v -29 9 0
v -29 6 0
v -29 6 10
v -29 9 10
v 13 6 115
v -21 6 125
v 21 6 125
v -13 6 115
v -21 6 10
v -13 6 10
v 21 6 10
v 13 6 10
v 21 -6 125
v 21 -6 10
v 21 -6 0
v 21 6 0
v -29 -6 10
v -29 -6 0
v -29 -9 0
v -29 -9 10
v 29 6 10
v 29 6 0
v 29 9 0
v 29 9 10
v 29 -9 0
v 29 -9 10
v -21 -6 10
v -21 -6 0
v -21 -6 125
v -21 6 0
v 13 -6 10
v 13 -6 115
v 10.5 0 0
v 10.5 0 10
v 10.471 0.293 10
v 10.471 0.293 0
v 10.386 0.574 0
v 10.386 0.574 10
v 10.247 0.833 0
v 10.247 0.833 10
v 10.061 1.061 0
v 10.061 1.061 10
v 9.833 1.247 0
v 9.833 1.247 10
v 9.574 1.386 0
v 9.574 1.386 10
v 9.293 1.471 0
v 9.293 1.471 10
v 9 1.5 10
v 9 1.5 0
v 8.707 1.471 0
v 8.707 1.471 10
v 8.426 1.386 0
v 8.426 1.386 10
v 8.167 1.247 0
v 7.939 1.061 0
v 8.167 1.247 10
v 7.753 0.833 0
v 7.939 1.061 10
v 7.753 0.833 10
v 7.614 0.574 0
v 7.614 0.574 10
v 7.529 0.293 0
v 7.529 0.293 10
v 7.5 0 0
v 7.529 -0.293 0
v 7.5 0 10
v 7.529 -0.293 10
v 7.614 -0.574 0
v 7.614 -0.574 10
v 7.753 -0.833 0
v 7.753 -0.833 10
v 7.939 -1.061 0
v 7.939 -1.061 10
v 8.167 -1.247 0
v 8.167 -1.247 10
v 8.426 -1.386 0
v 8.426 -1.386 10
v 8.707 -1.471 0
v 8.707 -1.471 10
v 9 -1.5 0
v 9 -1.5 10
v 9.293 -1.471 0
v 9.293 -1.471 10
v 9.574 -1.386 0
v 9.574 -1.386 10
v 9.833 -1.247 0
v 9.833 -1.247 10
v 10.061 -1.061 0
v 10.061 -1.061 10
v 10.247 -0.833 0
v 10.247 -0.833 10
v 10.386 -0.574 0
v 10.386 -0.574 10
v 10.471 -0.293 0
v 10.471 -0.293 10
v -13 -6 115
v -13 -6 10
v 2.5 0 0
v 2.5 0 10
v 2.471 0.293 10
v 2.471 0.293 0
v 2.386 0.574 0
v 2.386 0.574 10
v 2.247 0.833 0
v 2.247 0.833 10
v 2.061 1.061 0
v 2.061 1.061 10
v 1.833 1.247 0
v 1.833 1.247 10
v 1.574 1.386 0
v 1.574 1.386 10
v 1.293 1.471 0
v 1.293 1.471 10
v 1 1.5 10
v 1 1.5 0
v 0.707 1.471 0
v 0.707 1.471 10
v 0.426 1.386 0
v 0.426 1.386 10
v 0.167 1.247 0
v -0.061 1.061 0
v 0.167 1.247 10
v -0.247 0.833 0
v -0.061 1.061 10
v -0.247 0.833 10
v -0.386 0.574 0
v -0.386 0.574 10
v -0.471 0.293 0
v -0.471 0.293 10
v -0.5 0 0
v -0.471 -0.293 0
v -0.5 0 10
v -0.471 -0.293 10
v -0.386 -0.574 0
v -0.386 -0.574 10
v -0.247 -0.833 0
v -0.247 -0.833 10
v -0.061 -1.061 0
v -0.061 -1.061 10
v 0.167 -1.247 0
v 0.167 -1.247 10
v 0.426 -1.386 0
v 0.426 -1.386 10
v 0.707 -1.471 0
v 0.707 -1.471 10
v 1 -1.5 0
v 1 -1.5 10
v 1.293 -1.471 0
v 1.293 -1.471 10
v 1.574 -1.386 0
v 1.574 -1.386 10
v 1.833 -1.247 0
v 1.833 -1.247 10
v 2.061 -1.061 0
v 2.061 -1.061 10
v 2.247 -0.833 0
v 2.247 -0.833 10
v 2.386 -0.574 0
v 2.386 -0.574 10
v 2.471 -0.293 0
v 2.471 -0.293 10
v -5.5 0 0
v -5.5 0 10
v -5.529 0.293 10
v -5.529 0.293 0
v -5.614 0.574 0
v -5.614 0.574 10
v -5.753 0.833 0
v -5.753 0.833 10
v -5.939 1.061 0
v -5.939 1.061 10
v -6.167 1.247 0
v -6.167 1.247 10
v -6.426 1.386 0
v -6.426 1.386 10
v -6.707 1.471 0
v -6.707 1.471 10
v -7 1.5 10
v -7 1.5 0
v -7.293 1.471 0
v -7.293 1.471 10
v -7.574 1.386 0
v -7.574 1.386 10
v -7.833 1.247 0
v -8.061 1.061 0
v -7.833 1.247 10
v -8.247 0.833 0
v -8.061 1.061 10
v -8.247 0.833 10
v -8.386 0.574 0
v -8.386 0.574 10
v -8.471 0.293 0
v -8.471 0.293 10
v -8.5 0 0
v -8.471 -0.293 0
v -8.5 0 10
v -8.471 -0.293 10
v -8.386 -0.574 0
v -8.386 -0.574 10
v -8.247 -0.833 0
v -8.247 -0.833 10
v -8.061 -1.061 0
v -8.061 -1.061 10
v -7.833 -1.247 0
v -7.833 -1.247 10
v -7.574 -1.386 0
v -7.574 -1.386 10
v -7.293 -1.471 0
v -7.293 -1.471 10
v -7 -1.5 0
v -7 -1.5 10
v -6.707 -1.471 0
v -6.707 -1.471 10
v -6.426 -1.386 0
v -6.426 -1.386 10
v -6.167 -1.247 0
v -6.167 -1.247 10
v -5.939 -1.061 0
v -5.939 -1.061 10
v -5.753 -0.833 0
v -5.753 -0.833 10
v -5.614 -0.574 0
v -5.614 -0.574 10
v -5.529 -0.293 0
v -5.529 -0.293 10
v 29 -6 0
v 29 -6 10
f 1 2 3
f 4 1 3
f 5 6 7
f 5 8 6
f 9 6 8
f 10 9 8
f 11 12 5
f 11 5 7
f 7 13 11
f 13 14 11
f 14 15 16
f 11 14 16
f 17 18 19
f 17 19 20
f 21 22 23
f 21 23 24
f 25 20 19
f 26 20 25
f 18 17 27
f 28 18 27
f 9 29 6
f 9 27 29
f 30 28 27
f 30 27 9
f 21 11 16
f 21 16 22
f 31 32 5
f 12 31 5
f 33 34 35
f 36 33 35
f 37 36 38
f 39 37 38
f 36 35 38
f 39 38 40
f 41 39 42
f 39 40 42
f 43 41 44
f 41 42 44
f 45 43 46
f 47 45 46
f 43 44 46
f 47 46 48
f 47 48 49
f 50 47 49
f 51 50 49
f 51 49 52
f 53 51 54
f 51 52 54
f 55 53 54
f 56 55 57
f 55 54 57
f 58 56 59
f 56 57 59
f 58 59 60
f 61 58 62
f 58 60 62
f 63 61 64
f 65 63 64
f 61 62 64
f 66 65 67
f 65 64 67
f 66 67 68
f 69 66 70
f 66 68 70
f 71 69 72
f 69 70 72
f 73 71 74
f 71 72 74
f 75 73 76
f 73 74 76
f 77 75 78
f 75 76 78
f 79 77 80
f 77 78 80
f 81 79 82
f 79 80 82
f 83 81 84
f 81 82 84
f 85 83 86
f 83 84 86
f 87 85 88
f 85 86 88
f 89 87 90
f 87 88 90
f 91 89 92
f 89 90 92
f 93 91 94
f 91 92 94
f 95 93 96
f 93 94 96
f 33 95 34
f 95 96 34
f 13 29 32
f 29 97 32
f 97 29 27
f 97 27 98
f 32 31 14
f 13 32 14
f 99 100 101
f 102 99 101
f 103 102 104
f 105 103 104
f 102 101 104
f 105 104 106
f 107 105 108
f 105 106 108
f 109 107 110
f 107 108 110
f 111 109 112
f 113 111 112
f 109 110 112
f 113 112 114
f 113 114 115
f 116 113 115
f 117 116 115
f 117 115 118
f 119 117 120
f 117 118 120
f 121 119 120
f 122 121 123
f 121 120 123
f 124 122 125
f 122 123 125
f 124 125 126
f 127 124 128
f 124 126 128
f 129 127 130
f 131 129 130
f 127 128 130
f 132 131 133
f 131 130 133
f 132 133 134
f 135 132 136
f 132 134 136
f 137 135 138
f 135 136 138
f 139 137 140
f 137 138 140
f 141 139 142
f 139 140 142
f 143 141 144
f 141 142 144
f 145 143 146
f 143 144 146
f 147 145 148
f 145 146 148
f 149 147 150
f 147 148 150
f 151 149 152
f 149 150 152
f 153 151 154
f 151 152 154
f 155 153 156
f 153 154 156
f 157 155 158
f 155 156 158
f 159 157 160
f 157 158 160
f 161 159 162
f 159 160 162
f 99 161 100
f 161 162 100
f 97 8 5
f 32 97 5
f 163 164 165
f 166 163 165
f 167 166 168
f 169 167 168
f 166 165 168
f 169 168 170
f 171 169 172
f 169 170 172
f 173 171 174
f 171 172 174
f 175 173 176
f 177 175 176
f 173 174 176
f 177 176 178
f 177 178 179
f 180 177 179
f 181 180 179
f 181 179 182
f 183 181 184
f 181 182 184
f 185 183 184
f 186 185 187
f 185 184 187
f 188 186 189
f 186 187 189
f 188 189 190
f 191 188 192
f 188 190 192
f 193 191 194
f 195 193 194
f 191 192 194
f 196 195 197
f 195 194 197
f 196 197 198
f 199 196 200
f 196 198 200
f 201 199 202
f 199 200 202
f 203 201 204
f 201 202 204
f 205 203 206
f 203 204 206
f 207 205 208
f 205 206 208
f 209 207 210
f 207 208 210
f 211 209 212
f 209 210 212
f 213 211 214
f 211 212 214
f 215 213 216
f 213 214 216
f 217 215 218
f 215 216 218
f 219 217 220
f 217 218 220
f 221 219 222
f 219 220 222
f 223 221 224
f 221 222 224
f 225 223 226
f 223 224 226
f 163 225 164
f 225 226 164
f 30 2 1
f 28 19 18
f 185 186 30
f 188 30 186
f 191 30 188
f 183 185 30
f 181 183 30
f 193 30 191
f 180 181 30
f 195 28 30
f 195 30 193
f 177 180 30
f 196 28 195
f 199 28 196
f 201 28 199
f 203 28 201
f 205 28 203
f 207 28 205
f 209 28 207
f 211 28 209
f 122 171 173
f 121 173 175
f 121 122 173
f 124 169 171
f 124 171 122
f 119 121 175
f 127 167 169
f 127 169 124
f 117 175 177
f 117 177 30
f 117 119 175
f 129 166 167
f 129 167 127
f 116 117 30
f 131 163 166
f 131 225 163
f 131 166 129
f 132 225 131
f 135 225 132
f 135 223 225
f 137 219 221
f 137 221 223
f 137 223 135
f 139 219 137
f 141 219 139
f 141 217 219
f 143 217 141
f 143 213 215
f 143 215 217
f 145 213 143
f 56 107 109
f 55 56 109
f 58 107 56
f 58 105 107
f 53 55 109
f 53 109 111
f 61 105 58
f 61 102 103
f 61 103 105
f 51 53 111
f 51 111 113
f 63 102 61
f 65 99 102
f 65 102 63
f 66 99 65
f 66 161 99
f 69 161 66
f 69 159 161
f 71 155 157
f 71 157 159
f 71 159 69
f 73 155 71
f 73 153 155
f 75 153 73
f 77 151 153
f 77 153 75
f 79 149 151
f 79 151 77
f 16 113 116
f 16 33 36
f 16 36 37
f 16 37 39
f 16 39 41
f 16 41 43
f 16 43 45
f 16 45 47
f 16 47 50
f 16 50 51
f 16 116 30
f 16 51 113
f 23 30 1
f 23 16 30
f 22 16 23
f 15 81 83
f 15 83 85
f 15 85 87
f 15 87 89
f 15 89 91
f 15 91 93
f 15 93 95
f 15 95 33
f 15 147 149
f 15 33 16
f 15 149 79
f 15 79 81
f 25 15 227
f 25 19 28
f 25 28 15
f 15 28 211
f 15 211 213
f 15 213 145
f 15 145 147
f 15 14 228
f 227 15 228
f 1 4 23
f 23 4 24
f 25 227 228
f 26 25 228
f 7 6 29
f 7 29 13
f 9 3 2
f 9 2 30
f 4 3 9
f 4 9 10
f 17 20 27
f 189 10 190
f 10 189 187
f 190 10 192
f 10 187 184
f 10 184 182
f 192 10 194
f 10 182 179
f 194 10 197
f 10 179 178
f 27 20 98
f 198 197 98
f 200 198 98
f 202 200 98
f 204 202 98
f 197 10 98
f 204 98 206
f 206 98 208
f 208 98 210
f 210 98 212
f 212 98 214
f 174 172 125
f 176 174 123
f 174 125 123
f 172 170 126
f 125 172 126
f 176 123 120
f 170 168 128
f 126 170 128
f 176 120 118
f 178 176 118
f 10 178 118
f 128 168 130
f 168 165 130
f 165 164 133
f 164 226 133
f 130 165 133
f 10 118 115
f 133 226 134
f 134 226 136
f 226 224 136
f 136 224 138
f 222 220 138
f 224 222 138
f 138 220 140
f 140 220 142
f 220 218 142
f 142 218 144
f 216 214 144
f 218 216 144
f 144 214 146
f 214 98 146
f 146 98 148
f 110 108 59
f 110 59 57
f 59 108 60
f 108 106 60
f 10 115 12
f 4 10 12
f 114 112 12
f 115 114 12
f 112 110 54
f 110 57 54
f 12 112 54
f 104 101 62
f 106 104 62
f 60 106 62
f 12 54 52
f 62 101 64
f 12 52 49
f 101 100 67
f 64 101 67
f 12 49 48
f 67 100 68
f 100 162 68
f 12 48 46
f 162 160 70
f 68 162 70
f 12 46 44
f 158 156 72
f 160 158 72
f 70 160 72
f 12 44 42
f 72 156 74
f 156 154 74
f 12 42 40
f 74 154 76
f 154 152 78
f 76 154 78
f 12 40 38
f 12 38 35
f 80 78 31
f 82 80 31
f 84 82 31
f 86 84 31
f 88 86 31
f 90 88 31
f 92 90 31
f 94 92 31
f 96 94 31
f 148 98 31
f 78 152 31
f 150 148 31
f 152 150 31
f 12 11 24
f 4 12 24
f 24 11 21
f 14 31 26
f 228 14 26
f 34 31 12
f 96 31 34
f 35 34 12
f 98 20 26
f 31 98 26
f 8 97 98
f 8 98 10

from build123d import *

# Parameters (mm, degrees)
F0_W     = 42
F0_H     = 12
F1_DEPTH = 10
F2_W     = 8
F2_H     = 12
F3_DEPTH = 105
F4_W     = 42
F4_H     = 12
F5_DEPTH = 10
F6_W     = 58
F6_H     = 10
F7_DEPTH = 3
F8_R     = 1.5
F9_DEPTH = 9.9999997765


# Not quite as in the source:
# - a pattern or mirror of a feature is missing from the dataset's text; its kind, count and spacing are read off the source's solid


with BuildPart() as f1:
    # F0 (on Top) → F1 (new body)
    with BuildSketch(Plane.XY):
        Rectangle(F0_W, F0_H)
    extrude(amount=F1_DEPTH)

    # F2 (on face) → F3 (join)
    with BuildSketch(Plane.XY.offset(10)):
        with Locations((-17, 0)):
            Rectangle(F2_W, F2_H)
        with Locations((17, 0)):
            Rectangle(F2_W, F2_H)
    extrude(amount=F3_DEPTH)

    # F4 (on face) → F5 (join)
    with BuildSketch(Plane.XY.offset(115)):
        Rectangle(F4_W, F4_H)
    extrude(amount=F5_DEPTH)

    # F6 (on face) → F7 (join)
    with BuildSketch(Plane.XZ.offset(6)):
        with Locations((0, 5)):
            Rectangle(F6_W, F6_H)
    f7 = extrude(amount=F7_DEPTH)

    # F7_copies: F7 across plane
    add(f7.mirror(Plane.ZX))

    # F8 (on face) → F9 (cut)
    with BuildSketch(Plane.XY.offset(10)):
        with Locations((-7, 0)):
            Circle(F8_R)
        with Locations((1, 0)):
            Circle(F8_R)
        with Locations((9, 0)):
            Circle(F8_R)
    extrude(amount=-F9_DEPTH, mode=Mode.SUBTRACT)


solid = f1.part
